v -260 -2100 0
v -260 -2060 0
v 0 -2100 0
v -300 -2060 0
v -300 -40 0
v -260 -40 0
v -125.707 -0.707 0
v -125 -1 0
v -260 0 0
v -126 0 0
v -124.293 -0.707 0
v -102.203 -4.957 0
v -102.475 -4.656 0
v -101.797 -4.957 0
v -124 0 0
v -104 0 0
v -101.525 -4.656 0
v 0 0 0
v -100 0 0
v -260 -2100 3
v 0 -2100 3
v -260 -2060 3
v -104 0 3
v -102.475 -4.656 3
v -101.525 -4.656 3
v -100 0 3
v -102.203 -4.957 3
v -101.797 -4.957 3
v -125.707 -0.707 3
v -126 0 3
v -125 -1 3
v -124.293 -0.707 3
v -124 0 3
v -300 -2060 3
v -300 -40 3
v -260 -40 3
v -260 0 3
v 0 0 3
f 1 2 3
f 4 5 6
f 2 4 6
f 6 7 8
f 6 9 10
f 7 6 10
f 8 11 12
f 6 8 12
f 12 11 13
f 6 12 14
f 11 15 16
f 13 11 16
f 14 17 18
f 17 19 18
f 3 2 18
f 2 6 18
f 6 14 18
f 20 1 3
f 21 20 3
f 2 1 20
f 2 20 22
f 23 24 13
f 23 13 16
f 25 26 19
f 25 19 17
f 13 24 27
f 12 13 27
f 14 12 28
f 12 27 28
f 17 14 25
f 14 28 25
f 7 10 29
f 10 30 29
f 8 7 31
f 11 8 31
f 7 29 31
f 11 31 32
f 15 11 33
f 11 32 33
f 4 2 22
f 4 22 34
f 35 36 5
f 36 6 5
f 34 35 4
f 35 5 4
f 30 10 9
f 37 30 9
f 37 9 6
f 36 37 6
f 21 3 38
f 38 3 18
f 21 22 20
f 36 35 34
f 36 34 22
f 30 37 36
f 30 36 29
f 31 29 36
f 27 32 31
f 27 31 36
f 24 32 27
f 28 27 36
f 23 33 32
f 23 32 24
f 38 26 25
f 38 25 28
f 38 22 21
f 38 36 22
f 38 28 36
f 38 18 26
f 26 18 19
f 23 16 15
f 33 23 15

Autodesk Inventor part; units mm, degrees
ref_plane "YZ Plane" through (0, 0, 0) normal (1, 0, 0) x (0, 1, 0)
ref_plane "XZ Plane" through (0, 0, 0) normal (0, 1, 0) x (-1, 0, 0)
ref_plane "XY Plane" through (0, 0, 0) normal (0, 0, 1) x (1, 0, 0)
sketch "Sketch1" plane through (0, 0, 0) normal (0, 0, 1) x (1, 0, 0)
  line L0 (0, 0) -> (-300, 0)
  line L1 (-300, 0) -> (-300, -2100)
  line L2 (-300, -2100) -> (0, -2100)
  line L3 (0, -2100) -> (0, 0)
  line L4 (0, 0) -> (-40, 0)
  line L5 (-40, 0) -> (-40, -40)
  line L6 (-40, -40) -> (0, -40)
  line L7 (0, -40) -> (0, 0)
  line L8 (0, -2100) -> (-40, -2100)
  line L9 (-40, -2100) -> (-40, -2060)
  line L10 (-40, -2060) -> (0, -2060)
  line L11 (0, -2060) -> (0, -2100)
  line L12 (-300, 0) -> (-260, 0)
  line L13 (-260, 0) -> (-260, -40)
  line L14 (-260, -40) -> (-300, -40)
  line L15 (-300, -40) -> (-300, 0)
  line L16 (-300, -2100) -> (-260, -2100)
  line L17 (-260, -2100) -> (-260, -2060)
  line L18 (-260, -2060) -> (-300, -2060)
  line L19 (-300, -2060) -> (-300, -2100)
  line L20 (-220, -2100) -> (-130, -2100)
  line L21 (-130, -2100) -> (-130, -2060)
  line L22 (-130, -2060) -> (-220, -2060)
  line L23 (-220, -2060) -> (-220, -2100)
  line L24 (-220, 0) -> (-130, 0)
  line L25 (-130, 0) -> (-130, -40)
  line L26 (-130, -40) -> (-220, -40)
  line L27 (-220, -40) -> (-220, 0)
  point P0 (0, -40)
  point P1 (-40, 0)
  point P2 (-40, -2100)
  point P3 (0, -2060)
  point P4 (-130, -2100)
  point P5 (-130, 0)
  point P6 (-260, 0)
  point P7 (-300, -40)
  dimension "d22" = 300
  dimension "d23" = 2100
  dimension "d24" = 40
  dimension "d25" = 40
  dimension "d28" = 90
  dimension "d29" = 90
extrude "Plate1" add sketch "Sketch1" along normal blind 3 contours L3 L6 L5 L0 | L5 L6 L3 L10 L9 L2 L21 L22 L23 L17 L18 L1 L14 L13 L0 L27 L26 L25 | L25 L26 L27 L0 | L3 L2 L9 L10 | L2 L23 L22 L21
sketch "Sketch5" plane through (0, 0, 3) normal (0, 0, 1) x (1, 0, 0)
  line L0 (0, 0) -> (-100, 0) construction
  line L1 (-100, 0) -> (-100, -2) construction
  line L2 (-100, -2) -> (0, -2) construction
  line L3 (0, -2) -> (0, 0) construction
  line L4 (-100, 0) -> (-101.5248, -4.6556)
  arc A0 (-102.4752, -4.6556) -> (-101.5248, -4.6556) centre (-102, -4.5) ccw
  line L5 (-102.4752, -4.6556) -> (-104, 0)
  line L6 (-104, 0) -> (-100, 0)
  line L7 (-104, 0) -> (-106, 0) construction
  line L8 (-106, 0) -> (-108, 0)
  line L9 (-108, 0) -> (-108, -5)
  line L10 (-108, -5) -> (-106, -5)
  line L11 (-106, -5) -> (-106, 0)
  line L12 (-108, 0) -> (-110, 0) construction
  line L13 (-110, 0) -> (-112, 0)
  line L14 (-112, 0) -> (-112, -5)
  line L15 (-112, -5) -> (-110, -5)
  line L16 (-110, -5) -> (-110, 0)
  line L17 (-112, 0) -> (-114, 0) construction
  line L18 (-114, 0) -> (-116, 0)
  line L19 (-116, 0) -> (-116, -5)
  line L20 (-116, -5) -> (-114, -5)
  line L21 (-114, -5) -> (-114, 0)
  line L22 (-116, 0) -> (-118, 0) construction
  line L23 (-118, 0) -> (-120, 0)
  line L24 (-120, 0) -> (-120, -5)
  line L25 (-120, -5) -> (-118, -5)
  line L26 (-118, -5) -> (-118, 0)
  line L27 (-120, 0) -> (-125, 0) construction
  line L28 (-125, 0) -> (-130, 0) construction
  circle A1 centre (-125, 0) radius 1
  circle A2 centre (-130, 0) radius 1
  point P0 (-102, 0)
  dimension "d31" = 100
  dimension "d32" = 2
  dimension "d33" = 5
  dimension "d34" = 4
  dimension "d35" = 0.5
  dimension "d36" = 5
  dimension "d37" = 5
  dimension "d38" = 5
  dimension "d39" = 2
extrude "Cut1" cut sketch "Sketch5" against normal blind 3 contours L4 A0 L5 L6 | A1
equation "\"d34\" = 2 * d32"
equation "\"d35\" = 0.25 * d32"
equation "\"d39\" = d32"
equation "\"d40\" = Thickness"
equation "\"d2\" = Thickness"
equation "\"BendReliefWidth\" = Thickness"
equation "\"BendReliefDepth\" = 0.5 * Thickness"
equation "\"CornerReliefSize\" = 4 * Thickness"
equation "\"MinimumRemnant\" = 2 * Thickness"
equation "\"TransitionRadius\" = BendRadius"
equation "\"JacobiRadiusSize\" = BendRadius"
equation "\"GapSize\" = Thickness"
equation "\"Thickness\" = 3"
equation "\"BendRadius\" = 5"
properties part number "GnG frame 1.1 floor sheet 5" material "Stainless Steel"
